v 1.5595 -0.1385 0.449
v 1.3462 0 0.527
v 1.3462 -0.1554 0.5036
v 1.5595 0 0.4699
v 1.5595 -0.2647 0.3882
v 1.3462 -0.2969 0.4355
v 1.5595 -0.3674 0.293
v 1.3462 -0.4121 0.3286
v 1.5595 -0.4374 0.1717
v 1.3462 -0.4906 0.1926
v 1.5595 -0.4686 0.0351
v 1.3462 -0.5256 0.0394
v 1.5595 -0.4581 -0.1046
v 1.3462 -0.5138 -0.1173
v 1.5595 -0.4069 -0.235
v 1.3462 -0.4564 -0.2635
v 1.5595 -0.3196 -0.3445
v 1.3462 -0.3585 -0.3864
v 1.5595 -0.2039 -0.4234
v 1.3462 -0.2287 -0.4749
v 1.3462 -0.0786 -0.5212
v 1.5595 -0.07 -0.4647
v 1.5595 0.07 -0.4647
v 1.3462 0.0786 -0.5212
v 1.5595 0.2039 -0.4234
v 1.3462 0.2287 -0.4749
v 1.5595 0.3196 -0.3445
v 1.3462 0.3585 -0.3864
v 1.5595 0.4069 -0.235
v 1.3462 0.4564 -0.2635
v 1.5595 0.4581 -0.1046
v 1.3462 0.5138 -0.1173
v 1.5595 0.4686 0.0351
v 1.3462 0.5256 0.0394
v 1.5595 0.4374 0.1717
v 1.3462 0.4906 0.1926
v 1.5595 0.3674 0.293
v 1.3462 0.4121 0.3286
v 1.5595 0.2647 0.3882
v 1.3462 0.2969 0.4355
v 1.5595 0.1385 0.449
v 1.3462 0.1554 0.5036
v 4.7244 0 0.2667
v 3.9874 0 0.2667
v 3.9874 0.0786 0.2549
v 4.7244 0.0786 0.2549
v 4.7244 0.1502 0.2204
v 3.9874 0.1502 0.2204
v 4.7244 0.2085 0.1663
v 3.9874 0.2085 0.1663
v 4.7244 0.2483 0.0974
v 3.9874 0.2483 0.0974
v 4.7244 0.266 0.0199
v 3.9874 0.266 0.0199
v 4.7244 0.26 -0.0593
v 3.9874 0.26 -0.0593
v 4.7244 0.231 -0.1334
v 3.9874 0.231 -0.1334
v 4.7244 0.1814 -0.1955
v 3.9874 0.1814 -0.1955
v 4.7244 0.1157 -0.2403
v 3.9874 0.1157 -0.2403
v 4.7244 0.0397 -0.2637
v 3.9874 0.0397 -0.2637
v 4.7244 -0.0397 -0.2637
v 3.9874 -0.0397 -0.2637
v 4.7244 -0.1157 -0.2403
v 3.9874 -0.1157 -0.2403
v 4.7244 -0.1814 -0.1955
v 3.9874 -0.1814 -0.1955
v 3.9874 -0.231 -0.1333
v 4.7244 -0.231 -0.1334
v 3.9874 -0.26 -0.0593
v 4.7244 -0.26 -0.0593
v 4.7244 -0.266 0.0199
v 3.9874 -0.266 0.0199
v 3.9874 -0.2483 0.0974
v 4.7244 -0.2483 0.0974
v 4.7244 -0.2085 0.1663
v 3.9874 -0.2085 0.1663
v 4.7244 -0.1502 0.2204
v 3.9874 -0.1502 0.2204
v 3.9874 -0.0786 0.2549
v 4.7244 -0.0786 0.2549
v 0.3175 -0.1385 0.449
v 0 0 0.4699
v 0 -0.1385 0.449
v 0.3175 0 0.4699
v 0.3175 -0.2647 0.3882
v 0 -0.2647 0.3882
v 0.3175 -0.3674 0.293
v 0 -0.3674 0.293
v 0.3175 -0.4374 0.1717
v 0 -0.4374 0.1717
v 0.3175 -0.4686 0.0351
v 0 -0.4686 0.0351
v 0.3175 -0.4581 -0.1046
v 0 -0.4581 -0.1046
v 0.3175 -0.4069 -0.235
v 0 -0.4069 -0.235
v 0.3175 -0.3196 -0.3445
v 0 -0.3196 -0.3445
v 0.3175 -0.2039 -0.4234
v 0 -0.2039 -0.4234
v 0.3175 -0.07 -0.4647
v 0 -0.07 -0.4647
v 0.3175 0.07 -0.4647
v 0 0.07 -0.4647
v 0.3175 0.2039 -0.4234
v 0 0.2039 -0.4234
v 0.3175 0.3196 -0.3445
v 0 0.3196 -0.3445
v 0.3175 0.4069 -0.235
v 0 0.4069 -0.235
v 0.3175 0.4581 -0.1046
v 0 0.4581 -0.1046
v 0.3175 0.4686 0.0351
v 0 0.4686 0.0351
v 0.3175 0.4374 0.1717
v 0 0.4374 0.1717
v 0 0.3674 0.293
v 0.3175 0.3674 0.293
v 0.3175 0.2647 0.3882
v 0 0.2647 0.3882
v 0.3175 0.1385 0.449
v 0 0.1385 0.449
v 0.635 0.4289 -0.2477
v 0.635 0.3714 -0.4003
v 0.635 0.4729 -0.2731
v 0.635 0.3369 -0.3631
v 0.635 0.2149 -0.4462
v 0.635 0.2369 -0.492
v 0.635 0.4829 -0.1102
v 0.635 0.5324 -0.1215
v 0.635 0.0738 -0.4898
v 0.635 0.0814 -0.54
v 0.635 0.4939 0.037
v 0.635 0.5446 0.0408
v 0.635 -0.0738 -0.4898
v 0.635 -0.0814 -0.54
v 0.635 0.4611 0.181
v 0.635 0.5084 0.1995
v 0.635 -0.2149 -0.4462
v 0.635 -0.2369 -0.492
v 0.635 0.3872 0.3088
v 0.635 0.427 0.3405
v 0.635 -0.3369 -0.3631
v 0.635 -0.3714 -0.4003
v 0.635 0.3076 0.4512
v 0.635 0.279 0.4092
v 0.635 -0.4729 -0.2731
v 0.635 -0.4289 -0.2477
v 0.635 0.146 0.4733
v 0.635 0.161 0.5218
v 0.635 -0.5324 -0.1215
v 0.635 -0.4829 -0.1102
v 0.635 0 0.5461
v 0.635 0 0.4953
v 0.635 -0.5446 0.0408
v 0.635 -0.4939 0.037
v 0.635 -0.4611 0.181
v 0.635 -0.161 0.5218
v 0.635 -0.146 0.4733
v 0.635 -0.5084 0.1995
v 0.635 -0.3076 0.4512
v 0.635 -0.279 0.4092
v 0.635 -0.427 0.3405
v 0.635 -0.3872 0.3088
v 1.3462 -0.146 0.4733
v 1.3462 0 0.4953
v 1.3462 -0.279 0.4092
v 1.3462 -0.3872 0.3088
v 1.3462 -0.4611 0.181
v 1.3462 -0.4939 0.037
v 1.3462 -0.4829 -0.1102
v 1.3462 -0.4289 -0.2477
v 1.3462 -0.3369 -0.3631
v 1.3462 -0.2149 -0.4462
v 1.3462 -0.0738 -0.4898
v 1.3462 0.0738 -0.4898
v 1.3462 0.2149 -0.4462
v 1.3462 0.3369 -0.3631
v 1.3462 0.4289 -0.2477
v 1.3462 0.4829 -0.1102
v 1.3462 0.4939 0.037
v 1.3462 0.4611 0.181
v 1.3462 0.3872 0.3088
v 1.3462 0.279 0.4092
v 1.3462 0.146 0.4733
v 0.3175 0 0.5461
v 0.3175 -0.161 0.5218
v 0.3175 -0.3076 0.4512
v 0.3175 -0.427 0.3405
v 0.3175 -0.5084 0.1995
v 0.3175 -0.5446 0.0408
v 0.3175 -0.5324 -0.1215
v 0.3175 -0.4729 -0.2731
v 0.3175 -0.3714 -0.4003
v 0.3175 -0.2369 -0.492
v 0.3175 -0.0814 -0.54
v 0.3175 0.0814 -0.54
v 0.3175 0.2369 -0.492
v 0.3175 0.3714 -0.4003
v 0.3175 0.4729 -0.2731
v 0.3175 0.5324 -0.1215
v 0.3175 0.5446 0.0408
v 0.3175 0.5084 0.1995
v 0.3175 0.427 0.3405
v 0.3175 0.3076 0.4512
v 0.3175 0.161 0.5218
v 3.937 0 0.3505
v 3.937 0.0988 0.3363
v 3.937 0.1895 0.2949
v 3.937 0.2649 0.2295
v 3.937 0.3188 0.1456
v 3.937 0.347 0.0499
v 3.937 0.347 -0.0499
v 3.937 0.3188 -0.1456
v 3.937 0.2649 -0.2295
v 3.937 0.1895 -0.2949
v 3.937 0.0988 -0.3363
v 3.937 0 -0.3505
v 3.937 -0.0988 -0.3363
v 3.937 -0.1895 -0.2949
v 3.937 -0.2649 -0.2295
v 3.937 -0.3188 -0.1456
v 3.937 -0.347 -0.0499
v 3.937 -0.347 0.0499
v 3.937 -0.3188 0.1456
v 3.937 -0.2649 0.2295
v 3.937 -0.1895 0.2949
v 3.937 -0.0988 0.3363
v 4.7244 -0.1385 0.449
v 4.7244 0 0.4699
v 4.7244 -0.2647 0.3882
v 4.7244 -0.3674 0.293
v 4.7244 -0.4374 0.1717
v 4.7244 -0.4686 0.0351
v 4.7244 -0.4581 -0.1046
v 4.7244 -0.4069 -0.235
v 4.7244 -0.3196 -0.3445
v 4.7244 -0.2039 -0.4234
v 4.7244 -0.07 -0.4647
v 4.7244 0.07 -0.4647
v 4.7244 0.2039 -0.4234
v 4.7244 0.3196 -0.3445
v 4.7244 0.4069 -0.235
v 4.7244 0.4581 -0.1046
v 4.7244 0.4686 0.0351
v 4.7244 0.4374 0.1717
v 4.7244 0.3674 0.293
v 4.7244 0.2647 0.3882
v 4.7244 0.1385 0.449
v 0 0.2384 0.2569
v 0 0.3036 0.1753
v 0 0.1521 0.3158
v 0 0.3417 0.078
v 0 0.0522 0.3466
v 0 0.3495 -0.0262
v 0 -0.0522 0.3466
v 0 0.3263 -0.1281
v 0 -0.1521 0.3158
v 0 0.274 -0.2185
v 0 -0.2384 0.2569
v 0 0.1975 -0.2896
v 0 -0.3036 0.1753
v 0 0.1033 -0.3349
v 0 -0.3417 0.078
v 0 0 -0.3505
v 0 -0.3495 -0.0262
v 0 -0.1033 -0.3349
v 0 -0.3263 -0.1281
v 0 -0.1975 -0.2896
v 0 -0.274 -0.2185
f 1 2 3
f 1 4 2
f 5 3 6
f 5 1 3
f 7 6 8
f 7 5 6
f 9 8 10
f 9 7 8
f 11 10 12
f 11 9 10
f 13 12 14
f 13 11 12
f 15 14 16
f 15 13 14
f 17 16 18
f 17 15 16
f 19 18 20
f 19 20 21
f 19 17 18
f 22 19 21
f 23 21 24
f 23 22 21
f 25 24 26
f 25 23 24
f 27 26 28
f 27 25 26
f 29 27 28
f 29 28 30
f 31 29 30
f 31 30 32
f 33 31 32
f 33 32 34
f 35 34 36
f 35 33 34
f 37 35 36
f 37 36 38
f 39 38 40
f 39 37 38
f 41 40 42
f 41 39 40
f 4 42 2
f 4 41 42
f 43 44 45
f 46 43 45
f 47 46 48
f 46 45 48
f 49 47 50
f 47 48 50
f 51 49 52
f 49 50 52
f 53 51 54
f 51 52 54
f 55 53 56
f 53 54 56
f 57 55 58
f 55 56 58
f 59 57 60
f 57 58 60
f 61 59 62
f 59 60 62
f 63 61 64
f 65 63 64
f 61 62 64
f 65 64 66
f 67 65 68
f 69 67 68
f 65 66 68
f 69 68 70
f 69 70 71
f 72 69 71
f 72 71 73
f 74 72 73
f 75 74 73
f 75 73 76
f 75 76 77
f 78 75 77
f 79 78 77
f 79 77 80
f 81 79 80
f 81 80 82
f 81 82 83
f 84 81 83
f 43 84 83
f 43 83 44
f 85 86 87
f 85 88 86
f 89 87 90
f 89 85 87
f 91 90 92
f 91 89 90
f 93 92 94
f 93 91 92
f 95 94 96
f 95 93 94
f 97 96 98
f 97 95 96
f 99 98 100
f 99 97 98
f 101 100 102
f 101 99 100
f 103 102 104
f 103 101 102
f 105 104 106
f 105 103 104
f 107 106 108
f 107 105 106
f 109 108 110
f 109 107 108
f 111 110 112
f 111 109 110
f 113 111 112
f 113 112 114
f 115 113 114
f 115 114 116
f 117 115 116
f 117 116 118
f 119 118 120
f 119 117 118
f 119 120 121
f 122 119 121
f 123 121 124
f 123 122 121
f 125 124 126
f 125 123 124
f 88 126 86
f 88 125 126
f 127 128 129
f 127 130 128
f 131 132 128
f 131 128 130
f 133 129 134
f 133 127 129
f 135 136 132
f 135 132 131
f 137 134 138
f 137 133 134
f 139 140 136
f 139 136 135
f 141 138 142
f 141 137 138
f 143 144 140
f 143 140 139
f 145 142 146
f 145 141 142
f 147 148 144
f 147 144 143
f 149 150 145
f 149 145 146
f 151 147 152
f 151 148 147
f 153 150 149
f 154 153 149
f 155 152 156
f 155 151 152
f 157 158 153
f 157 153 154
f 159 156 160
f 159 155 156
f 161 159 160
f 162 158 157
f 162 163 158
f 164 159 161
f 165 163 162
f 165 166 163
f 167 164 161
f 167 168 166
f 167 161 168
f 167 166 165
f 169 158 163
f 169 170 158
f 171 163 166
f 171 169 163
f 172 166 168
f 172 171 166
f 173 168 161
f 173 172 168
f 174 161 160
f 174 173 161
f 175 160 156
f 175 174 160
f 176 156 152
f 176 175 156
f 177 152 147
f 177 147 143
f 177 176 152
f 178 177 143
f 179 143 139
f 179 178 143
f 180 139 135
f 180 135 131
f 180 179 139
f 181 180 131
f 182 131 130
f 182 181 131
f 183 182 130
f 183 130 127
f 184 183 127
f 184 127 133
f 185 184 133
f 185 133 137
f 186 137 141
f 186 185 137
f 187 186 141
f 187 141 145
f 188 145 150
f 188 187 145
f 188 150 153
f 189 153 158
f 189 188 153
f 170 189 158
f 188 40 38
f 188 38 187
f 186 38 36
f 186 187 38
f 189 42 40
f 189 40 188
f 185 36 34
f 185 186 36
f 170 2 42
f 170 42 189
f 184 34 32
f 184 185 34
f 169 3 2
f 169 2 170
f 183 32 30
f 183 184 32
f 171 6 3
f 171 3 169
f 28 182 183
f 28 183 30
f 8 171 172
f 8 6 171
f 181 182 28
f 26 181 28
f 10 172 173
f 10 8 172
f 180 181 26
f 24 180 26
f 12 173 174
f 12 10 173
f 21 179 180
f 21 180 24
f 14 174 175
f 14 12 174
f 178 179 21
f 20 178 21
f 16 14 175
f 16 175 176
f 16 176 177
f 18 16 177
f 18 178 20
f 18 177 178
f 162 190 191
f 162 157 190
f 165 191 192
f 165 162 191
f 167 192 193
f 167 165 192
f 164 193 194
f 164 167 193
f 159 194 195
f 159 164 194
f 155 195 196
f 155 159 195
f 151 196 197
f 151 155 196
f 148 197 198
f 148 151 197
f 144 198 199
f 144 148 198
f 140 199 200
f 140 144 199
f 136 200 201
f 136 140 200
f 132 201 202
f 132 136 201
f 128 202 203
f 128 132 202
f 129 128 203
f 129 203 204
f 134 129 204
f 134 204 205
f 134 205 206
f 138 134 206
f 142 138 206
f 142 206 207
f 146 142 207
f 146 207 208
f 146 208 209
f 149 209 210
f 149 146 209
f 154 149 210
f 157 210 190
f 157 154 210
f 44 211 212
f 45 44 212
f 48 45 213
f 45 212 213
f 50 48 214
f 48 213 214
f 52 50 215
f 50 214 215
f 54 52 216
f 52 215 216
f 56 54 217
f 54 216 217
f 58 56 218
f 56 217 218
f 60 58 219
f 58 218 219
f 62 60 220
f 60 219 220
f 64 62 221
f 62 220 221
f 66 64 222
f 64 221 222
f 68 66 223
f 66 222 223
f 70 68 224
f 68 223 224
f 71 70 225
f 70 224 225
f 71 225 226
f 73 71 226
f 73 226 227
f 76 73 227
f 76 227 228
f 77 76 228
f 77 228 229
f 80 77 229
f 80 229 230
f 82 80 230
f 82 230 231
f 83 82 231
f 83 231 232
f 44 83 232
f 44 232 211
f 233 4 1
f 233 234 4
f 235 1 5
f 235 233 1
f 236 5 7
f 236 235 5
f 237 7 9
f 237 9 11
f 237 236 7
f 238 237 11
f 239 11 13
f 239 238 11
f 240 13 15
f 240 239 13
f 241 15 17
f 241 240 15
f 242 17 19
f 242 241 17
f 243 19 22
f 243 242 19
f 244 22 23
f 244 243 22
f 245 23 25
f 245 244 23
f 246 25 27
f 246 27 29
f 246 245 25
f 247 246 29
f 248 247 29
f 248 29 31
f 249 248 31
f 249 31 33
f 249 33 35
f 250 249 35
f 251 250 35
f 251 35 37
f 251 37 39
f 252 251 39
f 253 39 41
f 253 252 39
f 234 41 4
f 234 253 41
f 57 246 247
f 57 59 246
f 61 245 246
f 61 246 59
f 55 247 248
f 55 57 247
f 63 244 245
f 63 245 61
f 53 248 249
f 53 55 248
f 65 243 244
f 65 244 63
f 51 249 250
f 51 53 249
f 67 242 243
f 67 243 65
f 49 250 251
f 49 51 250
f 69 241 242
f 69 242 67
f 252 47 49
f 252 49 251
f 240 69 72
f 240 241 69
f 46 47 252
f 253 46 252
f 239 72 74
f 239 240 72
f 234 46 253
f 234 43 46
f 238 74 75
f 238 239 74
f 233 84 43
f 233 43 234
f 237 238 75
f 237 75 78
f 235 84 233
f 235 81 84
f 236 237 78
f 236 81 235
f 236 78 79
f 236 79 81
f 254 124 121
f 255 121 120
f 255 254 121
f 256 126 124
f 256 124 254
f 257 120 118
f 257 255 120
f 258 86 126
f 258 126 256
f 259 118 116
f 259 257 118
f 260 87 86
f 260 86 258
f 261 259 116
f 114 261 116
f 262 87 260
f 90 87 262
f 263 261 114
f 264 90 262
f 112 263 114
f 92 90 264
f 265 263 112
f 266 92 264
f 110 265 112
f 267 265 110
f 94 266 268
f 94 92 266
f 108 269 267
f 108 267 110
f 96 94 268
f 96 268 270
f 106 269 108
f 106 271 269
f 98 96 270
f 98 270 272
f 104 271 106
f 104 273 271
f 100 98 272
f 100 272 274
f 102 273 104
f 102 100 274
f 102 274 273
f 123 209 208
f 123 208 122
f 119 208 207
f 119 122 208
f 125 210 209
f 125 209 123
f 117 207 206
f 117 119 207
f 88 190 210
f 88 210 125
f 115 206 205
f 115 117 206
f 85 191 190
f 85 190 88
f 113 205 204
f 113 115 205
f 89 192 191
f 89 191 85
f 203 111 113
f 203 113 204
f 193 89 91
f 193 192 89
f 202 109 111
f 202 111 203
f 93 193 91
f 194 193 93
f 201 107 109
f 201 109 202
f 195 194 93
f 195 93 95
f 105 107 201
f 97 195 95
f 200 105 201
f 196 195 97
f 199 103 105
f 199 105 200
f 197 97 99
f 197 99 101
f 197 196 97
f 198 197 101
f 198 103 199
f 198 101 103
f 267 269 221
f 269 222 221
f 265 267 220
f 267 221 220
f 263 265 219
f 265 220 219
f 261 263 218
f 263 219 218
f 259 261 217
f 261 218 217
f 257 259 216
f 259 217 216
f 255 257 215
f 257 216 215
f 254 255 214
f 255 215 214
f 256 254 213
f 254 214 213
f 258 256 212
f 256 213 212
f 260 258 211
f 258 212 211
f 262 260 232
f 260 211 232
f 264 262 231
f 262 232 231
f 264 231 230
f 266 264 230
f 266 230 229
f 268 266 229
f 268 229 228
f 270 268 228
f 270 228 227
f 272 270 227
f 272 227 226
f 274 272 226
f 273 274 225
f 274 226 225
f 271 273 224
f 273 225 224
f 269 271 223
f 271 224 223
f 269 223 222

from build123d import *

# Parameters (mm, degrees)
HOLE1_D     = 0.70104
HOLE1_DEPTH = 3.937
HOLE1_TIP   = 0.210613664
HOLE2_D     = 0.5334
HOLE2_DEPTH = 4.7244
HOLE2_TIP   = 0.160249527


with BuildPart() as part:
    # Sketch1 → RevolutionAngle1 (revolve)
    with BuildSketch(Plane.XY, mode=Mode.PRIVATE) as revolutionangle1_sk:
        Polygon((0, 0), (0, 0.4699), (0.3175, 0.4699), (0.3175, 0.5461), (0.635, 0.5461), (0.635, 0.4953), (1.3462, 0.4953), (1.3462, 0.52705), (1.559486704, 0.4699), (4.7244, 0.4699), (4.7244, 0), align=None)
    revolve(revolutionangle1_sk.sketch.rotate(Axis((0, 0, 0), (1, 0, 0)), 90), axis=Axis((0, 0, 0), (1, 0, 0)))

    # Hole1
    with Locations(Plane.ZY):
        with Locations((0, 0)):
            Hole(HOLE1_D / 2, depth=HOLE1_DEPTH)
            with Locations((0, 0, -(HOLE1_DEPTH + HOLE1_TIP / 2))):  # 118° drill point
                Cone(0, HOLE1_D / 2, HOLE1_TIP, mode=Mode.SUBTRACT)

    # Hole2
    with Locations(Plane(origin=(4.7244, 0, 0), x_dir=(0, 0, -1), z_dir=(1, 0, 0))):
        with Locations((0, 0)):
            Hole(HOLE2_D / 2, depth=HOLE2_DEPTH)
            with Locations((0, 0, -(HOLE2_DEPTH + HOLE2_TIP / 2))):  # 118° drill point
                Cone(0, HOLE2_D / 2, HOLE2_TIP, mode=Mode.SUBTRACT)


solid = part.part
